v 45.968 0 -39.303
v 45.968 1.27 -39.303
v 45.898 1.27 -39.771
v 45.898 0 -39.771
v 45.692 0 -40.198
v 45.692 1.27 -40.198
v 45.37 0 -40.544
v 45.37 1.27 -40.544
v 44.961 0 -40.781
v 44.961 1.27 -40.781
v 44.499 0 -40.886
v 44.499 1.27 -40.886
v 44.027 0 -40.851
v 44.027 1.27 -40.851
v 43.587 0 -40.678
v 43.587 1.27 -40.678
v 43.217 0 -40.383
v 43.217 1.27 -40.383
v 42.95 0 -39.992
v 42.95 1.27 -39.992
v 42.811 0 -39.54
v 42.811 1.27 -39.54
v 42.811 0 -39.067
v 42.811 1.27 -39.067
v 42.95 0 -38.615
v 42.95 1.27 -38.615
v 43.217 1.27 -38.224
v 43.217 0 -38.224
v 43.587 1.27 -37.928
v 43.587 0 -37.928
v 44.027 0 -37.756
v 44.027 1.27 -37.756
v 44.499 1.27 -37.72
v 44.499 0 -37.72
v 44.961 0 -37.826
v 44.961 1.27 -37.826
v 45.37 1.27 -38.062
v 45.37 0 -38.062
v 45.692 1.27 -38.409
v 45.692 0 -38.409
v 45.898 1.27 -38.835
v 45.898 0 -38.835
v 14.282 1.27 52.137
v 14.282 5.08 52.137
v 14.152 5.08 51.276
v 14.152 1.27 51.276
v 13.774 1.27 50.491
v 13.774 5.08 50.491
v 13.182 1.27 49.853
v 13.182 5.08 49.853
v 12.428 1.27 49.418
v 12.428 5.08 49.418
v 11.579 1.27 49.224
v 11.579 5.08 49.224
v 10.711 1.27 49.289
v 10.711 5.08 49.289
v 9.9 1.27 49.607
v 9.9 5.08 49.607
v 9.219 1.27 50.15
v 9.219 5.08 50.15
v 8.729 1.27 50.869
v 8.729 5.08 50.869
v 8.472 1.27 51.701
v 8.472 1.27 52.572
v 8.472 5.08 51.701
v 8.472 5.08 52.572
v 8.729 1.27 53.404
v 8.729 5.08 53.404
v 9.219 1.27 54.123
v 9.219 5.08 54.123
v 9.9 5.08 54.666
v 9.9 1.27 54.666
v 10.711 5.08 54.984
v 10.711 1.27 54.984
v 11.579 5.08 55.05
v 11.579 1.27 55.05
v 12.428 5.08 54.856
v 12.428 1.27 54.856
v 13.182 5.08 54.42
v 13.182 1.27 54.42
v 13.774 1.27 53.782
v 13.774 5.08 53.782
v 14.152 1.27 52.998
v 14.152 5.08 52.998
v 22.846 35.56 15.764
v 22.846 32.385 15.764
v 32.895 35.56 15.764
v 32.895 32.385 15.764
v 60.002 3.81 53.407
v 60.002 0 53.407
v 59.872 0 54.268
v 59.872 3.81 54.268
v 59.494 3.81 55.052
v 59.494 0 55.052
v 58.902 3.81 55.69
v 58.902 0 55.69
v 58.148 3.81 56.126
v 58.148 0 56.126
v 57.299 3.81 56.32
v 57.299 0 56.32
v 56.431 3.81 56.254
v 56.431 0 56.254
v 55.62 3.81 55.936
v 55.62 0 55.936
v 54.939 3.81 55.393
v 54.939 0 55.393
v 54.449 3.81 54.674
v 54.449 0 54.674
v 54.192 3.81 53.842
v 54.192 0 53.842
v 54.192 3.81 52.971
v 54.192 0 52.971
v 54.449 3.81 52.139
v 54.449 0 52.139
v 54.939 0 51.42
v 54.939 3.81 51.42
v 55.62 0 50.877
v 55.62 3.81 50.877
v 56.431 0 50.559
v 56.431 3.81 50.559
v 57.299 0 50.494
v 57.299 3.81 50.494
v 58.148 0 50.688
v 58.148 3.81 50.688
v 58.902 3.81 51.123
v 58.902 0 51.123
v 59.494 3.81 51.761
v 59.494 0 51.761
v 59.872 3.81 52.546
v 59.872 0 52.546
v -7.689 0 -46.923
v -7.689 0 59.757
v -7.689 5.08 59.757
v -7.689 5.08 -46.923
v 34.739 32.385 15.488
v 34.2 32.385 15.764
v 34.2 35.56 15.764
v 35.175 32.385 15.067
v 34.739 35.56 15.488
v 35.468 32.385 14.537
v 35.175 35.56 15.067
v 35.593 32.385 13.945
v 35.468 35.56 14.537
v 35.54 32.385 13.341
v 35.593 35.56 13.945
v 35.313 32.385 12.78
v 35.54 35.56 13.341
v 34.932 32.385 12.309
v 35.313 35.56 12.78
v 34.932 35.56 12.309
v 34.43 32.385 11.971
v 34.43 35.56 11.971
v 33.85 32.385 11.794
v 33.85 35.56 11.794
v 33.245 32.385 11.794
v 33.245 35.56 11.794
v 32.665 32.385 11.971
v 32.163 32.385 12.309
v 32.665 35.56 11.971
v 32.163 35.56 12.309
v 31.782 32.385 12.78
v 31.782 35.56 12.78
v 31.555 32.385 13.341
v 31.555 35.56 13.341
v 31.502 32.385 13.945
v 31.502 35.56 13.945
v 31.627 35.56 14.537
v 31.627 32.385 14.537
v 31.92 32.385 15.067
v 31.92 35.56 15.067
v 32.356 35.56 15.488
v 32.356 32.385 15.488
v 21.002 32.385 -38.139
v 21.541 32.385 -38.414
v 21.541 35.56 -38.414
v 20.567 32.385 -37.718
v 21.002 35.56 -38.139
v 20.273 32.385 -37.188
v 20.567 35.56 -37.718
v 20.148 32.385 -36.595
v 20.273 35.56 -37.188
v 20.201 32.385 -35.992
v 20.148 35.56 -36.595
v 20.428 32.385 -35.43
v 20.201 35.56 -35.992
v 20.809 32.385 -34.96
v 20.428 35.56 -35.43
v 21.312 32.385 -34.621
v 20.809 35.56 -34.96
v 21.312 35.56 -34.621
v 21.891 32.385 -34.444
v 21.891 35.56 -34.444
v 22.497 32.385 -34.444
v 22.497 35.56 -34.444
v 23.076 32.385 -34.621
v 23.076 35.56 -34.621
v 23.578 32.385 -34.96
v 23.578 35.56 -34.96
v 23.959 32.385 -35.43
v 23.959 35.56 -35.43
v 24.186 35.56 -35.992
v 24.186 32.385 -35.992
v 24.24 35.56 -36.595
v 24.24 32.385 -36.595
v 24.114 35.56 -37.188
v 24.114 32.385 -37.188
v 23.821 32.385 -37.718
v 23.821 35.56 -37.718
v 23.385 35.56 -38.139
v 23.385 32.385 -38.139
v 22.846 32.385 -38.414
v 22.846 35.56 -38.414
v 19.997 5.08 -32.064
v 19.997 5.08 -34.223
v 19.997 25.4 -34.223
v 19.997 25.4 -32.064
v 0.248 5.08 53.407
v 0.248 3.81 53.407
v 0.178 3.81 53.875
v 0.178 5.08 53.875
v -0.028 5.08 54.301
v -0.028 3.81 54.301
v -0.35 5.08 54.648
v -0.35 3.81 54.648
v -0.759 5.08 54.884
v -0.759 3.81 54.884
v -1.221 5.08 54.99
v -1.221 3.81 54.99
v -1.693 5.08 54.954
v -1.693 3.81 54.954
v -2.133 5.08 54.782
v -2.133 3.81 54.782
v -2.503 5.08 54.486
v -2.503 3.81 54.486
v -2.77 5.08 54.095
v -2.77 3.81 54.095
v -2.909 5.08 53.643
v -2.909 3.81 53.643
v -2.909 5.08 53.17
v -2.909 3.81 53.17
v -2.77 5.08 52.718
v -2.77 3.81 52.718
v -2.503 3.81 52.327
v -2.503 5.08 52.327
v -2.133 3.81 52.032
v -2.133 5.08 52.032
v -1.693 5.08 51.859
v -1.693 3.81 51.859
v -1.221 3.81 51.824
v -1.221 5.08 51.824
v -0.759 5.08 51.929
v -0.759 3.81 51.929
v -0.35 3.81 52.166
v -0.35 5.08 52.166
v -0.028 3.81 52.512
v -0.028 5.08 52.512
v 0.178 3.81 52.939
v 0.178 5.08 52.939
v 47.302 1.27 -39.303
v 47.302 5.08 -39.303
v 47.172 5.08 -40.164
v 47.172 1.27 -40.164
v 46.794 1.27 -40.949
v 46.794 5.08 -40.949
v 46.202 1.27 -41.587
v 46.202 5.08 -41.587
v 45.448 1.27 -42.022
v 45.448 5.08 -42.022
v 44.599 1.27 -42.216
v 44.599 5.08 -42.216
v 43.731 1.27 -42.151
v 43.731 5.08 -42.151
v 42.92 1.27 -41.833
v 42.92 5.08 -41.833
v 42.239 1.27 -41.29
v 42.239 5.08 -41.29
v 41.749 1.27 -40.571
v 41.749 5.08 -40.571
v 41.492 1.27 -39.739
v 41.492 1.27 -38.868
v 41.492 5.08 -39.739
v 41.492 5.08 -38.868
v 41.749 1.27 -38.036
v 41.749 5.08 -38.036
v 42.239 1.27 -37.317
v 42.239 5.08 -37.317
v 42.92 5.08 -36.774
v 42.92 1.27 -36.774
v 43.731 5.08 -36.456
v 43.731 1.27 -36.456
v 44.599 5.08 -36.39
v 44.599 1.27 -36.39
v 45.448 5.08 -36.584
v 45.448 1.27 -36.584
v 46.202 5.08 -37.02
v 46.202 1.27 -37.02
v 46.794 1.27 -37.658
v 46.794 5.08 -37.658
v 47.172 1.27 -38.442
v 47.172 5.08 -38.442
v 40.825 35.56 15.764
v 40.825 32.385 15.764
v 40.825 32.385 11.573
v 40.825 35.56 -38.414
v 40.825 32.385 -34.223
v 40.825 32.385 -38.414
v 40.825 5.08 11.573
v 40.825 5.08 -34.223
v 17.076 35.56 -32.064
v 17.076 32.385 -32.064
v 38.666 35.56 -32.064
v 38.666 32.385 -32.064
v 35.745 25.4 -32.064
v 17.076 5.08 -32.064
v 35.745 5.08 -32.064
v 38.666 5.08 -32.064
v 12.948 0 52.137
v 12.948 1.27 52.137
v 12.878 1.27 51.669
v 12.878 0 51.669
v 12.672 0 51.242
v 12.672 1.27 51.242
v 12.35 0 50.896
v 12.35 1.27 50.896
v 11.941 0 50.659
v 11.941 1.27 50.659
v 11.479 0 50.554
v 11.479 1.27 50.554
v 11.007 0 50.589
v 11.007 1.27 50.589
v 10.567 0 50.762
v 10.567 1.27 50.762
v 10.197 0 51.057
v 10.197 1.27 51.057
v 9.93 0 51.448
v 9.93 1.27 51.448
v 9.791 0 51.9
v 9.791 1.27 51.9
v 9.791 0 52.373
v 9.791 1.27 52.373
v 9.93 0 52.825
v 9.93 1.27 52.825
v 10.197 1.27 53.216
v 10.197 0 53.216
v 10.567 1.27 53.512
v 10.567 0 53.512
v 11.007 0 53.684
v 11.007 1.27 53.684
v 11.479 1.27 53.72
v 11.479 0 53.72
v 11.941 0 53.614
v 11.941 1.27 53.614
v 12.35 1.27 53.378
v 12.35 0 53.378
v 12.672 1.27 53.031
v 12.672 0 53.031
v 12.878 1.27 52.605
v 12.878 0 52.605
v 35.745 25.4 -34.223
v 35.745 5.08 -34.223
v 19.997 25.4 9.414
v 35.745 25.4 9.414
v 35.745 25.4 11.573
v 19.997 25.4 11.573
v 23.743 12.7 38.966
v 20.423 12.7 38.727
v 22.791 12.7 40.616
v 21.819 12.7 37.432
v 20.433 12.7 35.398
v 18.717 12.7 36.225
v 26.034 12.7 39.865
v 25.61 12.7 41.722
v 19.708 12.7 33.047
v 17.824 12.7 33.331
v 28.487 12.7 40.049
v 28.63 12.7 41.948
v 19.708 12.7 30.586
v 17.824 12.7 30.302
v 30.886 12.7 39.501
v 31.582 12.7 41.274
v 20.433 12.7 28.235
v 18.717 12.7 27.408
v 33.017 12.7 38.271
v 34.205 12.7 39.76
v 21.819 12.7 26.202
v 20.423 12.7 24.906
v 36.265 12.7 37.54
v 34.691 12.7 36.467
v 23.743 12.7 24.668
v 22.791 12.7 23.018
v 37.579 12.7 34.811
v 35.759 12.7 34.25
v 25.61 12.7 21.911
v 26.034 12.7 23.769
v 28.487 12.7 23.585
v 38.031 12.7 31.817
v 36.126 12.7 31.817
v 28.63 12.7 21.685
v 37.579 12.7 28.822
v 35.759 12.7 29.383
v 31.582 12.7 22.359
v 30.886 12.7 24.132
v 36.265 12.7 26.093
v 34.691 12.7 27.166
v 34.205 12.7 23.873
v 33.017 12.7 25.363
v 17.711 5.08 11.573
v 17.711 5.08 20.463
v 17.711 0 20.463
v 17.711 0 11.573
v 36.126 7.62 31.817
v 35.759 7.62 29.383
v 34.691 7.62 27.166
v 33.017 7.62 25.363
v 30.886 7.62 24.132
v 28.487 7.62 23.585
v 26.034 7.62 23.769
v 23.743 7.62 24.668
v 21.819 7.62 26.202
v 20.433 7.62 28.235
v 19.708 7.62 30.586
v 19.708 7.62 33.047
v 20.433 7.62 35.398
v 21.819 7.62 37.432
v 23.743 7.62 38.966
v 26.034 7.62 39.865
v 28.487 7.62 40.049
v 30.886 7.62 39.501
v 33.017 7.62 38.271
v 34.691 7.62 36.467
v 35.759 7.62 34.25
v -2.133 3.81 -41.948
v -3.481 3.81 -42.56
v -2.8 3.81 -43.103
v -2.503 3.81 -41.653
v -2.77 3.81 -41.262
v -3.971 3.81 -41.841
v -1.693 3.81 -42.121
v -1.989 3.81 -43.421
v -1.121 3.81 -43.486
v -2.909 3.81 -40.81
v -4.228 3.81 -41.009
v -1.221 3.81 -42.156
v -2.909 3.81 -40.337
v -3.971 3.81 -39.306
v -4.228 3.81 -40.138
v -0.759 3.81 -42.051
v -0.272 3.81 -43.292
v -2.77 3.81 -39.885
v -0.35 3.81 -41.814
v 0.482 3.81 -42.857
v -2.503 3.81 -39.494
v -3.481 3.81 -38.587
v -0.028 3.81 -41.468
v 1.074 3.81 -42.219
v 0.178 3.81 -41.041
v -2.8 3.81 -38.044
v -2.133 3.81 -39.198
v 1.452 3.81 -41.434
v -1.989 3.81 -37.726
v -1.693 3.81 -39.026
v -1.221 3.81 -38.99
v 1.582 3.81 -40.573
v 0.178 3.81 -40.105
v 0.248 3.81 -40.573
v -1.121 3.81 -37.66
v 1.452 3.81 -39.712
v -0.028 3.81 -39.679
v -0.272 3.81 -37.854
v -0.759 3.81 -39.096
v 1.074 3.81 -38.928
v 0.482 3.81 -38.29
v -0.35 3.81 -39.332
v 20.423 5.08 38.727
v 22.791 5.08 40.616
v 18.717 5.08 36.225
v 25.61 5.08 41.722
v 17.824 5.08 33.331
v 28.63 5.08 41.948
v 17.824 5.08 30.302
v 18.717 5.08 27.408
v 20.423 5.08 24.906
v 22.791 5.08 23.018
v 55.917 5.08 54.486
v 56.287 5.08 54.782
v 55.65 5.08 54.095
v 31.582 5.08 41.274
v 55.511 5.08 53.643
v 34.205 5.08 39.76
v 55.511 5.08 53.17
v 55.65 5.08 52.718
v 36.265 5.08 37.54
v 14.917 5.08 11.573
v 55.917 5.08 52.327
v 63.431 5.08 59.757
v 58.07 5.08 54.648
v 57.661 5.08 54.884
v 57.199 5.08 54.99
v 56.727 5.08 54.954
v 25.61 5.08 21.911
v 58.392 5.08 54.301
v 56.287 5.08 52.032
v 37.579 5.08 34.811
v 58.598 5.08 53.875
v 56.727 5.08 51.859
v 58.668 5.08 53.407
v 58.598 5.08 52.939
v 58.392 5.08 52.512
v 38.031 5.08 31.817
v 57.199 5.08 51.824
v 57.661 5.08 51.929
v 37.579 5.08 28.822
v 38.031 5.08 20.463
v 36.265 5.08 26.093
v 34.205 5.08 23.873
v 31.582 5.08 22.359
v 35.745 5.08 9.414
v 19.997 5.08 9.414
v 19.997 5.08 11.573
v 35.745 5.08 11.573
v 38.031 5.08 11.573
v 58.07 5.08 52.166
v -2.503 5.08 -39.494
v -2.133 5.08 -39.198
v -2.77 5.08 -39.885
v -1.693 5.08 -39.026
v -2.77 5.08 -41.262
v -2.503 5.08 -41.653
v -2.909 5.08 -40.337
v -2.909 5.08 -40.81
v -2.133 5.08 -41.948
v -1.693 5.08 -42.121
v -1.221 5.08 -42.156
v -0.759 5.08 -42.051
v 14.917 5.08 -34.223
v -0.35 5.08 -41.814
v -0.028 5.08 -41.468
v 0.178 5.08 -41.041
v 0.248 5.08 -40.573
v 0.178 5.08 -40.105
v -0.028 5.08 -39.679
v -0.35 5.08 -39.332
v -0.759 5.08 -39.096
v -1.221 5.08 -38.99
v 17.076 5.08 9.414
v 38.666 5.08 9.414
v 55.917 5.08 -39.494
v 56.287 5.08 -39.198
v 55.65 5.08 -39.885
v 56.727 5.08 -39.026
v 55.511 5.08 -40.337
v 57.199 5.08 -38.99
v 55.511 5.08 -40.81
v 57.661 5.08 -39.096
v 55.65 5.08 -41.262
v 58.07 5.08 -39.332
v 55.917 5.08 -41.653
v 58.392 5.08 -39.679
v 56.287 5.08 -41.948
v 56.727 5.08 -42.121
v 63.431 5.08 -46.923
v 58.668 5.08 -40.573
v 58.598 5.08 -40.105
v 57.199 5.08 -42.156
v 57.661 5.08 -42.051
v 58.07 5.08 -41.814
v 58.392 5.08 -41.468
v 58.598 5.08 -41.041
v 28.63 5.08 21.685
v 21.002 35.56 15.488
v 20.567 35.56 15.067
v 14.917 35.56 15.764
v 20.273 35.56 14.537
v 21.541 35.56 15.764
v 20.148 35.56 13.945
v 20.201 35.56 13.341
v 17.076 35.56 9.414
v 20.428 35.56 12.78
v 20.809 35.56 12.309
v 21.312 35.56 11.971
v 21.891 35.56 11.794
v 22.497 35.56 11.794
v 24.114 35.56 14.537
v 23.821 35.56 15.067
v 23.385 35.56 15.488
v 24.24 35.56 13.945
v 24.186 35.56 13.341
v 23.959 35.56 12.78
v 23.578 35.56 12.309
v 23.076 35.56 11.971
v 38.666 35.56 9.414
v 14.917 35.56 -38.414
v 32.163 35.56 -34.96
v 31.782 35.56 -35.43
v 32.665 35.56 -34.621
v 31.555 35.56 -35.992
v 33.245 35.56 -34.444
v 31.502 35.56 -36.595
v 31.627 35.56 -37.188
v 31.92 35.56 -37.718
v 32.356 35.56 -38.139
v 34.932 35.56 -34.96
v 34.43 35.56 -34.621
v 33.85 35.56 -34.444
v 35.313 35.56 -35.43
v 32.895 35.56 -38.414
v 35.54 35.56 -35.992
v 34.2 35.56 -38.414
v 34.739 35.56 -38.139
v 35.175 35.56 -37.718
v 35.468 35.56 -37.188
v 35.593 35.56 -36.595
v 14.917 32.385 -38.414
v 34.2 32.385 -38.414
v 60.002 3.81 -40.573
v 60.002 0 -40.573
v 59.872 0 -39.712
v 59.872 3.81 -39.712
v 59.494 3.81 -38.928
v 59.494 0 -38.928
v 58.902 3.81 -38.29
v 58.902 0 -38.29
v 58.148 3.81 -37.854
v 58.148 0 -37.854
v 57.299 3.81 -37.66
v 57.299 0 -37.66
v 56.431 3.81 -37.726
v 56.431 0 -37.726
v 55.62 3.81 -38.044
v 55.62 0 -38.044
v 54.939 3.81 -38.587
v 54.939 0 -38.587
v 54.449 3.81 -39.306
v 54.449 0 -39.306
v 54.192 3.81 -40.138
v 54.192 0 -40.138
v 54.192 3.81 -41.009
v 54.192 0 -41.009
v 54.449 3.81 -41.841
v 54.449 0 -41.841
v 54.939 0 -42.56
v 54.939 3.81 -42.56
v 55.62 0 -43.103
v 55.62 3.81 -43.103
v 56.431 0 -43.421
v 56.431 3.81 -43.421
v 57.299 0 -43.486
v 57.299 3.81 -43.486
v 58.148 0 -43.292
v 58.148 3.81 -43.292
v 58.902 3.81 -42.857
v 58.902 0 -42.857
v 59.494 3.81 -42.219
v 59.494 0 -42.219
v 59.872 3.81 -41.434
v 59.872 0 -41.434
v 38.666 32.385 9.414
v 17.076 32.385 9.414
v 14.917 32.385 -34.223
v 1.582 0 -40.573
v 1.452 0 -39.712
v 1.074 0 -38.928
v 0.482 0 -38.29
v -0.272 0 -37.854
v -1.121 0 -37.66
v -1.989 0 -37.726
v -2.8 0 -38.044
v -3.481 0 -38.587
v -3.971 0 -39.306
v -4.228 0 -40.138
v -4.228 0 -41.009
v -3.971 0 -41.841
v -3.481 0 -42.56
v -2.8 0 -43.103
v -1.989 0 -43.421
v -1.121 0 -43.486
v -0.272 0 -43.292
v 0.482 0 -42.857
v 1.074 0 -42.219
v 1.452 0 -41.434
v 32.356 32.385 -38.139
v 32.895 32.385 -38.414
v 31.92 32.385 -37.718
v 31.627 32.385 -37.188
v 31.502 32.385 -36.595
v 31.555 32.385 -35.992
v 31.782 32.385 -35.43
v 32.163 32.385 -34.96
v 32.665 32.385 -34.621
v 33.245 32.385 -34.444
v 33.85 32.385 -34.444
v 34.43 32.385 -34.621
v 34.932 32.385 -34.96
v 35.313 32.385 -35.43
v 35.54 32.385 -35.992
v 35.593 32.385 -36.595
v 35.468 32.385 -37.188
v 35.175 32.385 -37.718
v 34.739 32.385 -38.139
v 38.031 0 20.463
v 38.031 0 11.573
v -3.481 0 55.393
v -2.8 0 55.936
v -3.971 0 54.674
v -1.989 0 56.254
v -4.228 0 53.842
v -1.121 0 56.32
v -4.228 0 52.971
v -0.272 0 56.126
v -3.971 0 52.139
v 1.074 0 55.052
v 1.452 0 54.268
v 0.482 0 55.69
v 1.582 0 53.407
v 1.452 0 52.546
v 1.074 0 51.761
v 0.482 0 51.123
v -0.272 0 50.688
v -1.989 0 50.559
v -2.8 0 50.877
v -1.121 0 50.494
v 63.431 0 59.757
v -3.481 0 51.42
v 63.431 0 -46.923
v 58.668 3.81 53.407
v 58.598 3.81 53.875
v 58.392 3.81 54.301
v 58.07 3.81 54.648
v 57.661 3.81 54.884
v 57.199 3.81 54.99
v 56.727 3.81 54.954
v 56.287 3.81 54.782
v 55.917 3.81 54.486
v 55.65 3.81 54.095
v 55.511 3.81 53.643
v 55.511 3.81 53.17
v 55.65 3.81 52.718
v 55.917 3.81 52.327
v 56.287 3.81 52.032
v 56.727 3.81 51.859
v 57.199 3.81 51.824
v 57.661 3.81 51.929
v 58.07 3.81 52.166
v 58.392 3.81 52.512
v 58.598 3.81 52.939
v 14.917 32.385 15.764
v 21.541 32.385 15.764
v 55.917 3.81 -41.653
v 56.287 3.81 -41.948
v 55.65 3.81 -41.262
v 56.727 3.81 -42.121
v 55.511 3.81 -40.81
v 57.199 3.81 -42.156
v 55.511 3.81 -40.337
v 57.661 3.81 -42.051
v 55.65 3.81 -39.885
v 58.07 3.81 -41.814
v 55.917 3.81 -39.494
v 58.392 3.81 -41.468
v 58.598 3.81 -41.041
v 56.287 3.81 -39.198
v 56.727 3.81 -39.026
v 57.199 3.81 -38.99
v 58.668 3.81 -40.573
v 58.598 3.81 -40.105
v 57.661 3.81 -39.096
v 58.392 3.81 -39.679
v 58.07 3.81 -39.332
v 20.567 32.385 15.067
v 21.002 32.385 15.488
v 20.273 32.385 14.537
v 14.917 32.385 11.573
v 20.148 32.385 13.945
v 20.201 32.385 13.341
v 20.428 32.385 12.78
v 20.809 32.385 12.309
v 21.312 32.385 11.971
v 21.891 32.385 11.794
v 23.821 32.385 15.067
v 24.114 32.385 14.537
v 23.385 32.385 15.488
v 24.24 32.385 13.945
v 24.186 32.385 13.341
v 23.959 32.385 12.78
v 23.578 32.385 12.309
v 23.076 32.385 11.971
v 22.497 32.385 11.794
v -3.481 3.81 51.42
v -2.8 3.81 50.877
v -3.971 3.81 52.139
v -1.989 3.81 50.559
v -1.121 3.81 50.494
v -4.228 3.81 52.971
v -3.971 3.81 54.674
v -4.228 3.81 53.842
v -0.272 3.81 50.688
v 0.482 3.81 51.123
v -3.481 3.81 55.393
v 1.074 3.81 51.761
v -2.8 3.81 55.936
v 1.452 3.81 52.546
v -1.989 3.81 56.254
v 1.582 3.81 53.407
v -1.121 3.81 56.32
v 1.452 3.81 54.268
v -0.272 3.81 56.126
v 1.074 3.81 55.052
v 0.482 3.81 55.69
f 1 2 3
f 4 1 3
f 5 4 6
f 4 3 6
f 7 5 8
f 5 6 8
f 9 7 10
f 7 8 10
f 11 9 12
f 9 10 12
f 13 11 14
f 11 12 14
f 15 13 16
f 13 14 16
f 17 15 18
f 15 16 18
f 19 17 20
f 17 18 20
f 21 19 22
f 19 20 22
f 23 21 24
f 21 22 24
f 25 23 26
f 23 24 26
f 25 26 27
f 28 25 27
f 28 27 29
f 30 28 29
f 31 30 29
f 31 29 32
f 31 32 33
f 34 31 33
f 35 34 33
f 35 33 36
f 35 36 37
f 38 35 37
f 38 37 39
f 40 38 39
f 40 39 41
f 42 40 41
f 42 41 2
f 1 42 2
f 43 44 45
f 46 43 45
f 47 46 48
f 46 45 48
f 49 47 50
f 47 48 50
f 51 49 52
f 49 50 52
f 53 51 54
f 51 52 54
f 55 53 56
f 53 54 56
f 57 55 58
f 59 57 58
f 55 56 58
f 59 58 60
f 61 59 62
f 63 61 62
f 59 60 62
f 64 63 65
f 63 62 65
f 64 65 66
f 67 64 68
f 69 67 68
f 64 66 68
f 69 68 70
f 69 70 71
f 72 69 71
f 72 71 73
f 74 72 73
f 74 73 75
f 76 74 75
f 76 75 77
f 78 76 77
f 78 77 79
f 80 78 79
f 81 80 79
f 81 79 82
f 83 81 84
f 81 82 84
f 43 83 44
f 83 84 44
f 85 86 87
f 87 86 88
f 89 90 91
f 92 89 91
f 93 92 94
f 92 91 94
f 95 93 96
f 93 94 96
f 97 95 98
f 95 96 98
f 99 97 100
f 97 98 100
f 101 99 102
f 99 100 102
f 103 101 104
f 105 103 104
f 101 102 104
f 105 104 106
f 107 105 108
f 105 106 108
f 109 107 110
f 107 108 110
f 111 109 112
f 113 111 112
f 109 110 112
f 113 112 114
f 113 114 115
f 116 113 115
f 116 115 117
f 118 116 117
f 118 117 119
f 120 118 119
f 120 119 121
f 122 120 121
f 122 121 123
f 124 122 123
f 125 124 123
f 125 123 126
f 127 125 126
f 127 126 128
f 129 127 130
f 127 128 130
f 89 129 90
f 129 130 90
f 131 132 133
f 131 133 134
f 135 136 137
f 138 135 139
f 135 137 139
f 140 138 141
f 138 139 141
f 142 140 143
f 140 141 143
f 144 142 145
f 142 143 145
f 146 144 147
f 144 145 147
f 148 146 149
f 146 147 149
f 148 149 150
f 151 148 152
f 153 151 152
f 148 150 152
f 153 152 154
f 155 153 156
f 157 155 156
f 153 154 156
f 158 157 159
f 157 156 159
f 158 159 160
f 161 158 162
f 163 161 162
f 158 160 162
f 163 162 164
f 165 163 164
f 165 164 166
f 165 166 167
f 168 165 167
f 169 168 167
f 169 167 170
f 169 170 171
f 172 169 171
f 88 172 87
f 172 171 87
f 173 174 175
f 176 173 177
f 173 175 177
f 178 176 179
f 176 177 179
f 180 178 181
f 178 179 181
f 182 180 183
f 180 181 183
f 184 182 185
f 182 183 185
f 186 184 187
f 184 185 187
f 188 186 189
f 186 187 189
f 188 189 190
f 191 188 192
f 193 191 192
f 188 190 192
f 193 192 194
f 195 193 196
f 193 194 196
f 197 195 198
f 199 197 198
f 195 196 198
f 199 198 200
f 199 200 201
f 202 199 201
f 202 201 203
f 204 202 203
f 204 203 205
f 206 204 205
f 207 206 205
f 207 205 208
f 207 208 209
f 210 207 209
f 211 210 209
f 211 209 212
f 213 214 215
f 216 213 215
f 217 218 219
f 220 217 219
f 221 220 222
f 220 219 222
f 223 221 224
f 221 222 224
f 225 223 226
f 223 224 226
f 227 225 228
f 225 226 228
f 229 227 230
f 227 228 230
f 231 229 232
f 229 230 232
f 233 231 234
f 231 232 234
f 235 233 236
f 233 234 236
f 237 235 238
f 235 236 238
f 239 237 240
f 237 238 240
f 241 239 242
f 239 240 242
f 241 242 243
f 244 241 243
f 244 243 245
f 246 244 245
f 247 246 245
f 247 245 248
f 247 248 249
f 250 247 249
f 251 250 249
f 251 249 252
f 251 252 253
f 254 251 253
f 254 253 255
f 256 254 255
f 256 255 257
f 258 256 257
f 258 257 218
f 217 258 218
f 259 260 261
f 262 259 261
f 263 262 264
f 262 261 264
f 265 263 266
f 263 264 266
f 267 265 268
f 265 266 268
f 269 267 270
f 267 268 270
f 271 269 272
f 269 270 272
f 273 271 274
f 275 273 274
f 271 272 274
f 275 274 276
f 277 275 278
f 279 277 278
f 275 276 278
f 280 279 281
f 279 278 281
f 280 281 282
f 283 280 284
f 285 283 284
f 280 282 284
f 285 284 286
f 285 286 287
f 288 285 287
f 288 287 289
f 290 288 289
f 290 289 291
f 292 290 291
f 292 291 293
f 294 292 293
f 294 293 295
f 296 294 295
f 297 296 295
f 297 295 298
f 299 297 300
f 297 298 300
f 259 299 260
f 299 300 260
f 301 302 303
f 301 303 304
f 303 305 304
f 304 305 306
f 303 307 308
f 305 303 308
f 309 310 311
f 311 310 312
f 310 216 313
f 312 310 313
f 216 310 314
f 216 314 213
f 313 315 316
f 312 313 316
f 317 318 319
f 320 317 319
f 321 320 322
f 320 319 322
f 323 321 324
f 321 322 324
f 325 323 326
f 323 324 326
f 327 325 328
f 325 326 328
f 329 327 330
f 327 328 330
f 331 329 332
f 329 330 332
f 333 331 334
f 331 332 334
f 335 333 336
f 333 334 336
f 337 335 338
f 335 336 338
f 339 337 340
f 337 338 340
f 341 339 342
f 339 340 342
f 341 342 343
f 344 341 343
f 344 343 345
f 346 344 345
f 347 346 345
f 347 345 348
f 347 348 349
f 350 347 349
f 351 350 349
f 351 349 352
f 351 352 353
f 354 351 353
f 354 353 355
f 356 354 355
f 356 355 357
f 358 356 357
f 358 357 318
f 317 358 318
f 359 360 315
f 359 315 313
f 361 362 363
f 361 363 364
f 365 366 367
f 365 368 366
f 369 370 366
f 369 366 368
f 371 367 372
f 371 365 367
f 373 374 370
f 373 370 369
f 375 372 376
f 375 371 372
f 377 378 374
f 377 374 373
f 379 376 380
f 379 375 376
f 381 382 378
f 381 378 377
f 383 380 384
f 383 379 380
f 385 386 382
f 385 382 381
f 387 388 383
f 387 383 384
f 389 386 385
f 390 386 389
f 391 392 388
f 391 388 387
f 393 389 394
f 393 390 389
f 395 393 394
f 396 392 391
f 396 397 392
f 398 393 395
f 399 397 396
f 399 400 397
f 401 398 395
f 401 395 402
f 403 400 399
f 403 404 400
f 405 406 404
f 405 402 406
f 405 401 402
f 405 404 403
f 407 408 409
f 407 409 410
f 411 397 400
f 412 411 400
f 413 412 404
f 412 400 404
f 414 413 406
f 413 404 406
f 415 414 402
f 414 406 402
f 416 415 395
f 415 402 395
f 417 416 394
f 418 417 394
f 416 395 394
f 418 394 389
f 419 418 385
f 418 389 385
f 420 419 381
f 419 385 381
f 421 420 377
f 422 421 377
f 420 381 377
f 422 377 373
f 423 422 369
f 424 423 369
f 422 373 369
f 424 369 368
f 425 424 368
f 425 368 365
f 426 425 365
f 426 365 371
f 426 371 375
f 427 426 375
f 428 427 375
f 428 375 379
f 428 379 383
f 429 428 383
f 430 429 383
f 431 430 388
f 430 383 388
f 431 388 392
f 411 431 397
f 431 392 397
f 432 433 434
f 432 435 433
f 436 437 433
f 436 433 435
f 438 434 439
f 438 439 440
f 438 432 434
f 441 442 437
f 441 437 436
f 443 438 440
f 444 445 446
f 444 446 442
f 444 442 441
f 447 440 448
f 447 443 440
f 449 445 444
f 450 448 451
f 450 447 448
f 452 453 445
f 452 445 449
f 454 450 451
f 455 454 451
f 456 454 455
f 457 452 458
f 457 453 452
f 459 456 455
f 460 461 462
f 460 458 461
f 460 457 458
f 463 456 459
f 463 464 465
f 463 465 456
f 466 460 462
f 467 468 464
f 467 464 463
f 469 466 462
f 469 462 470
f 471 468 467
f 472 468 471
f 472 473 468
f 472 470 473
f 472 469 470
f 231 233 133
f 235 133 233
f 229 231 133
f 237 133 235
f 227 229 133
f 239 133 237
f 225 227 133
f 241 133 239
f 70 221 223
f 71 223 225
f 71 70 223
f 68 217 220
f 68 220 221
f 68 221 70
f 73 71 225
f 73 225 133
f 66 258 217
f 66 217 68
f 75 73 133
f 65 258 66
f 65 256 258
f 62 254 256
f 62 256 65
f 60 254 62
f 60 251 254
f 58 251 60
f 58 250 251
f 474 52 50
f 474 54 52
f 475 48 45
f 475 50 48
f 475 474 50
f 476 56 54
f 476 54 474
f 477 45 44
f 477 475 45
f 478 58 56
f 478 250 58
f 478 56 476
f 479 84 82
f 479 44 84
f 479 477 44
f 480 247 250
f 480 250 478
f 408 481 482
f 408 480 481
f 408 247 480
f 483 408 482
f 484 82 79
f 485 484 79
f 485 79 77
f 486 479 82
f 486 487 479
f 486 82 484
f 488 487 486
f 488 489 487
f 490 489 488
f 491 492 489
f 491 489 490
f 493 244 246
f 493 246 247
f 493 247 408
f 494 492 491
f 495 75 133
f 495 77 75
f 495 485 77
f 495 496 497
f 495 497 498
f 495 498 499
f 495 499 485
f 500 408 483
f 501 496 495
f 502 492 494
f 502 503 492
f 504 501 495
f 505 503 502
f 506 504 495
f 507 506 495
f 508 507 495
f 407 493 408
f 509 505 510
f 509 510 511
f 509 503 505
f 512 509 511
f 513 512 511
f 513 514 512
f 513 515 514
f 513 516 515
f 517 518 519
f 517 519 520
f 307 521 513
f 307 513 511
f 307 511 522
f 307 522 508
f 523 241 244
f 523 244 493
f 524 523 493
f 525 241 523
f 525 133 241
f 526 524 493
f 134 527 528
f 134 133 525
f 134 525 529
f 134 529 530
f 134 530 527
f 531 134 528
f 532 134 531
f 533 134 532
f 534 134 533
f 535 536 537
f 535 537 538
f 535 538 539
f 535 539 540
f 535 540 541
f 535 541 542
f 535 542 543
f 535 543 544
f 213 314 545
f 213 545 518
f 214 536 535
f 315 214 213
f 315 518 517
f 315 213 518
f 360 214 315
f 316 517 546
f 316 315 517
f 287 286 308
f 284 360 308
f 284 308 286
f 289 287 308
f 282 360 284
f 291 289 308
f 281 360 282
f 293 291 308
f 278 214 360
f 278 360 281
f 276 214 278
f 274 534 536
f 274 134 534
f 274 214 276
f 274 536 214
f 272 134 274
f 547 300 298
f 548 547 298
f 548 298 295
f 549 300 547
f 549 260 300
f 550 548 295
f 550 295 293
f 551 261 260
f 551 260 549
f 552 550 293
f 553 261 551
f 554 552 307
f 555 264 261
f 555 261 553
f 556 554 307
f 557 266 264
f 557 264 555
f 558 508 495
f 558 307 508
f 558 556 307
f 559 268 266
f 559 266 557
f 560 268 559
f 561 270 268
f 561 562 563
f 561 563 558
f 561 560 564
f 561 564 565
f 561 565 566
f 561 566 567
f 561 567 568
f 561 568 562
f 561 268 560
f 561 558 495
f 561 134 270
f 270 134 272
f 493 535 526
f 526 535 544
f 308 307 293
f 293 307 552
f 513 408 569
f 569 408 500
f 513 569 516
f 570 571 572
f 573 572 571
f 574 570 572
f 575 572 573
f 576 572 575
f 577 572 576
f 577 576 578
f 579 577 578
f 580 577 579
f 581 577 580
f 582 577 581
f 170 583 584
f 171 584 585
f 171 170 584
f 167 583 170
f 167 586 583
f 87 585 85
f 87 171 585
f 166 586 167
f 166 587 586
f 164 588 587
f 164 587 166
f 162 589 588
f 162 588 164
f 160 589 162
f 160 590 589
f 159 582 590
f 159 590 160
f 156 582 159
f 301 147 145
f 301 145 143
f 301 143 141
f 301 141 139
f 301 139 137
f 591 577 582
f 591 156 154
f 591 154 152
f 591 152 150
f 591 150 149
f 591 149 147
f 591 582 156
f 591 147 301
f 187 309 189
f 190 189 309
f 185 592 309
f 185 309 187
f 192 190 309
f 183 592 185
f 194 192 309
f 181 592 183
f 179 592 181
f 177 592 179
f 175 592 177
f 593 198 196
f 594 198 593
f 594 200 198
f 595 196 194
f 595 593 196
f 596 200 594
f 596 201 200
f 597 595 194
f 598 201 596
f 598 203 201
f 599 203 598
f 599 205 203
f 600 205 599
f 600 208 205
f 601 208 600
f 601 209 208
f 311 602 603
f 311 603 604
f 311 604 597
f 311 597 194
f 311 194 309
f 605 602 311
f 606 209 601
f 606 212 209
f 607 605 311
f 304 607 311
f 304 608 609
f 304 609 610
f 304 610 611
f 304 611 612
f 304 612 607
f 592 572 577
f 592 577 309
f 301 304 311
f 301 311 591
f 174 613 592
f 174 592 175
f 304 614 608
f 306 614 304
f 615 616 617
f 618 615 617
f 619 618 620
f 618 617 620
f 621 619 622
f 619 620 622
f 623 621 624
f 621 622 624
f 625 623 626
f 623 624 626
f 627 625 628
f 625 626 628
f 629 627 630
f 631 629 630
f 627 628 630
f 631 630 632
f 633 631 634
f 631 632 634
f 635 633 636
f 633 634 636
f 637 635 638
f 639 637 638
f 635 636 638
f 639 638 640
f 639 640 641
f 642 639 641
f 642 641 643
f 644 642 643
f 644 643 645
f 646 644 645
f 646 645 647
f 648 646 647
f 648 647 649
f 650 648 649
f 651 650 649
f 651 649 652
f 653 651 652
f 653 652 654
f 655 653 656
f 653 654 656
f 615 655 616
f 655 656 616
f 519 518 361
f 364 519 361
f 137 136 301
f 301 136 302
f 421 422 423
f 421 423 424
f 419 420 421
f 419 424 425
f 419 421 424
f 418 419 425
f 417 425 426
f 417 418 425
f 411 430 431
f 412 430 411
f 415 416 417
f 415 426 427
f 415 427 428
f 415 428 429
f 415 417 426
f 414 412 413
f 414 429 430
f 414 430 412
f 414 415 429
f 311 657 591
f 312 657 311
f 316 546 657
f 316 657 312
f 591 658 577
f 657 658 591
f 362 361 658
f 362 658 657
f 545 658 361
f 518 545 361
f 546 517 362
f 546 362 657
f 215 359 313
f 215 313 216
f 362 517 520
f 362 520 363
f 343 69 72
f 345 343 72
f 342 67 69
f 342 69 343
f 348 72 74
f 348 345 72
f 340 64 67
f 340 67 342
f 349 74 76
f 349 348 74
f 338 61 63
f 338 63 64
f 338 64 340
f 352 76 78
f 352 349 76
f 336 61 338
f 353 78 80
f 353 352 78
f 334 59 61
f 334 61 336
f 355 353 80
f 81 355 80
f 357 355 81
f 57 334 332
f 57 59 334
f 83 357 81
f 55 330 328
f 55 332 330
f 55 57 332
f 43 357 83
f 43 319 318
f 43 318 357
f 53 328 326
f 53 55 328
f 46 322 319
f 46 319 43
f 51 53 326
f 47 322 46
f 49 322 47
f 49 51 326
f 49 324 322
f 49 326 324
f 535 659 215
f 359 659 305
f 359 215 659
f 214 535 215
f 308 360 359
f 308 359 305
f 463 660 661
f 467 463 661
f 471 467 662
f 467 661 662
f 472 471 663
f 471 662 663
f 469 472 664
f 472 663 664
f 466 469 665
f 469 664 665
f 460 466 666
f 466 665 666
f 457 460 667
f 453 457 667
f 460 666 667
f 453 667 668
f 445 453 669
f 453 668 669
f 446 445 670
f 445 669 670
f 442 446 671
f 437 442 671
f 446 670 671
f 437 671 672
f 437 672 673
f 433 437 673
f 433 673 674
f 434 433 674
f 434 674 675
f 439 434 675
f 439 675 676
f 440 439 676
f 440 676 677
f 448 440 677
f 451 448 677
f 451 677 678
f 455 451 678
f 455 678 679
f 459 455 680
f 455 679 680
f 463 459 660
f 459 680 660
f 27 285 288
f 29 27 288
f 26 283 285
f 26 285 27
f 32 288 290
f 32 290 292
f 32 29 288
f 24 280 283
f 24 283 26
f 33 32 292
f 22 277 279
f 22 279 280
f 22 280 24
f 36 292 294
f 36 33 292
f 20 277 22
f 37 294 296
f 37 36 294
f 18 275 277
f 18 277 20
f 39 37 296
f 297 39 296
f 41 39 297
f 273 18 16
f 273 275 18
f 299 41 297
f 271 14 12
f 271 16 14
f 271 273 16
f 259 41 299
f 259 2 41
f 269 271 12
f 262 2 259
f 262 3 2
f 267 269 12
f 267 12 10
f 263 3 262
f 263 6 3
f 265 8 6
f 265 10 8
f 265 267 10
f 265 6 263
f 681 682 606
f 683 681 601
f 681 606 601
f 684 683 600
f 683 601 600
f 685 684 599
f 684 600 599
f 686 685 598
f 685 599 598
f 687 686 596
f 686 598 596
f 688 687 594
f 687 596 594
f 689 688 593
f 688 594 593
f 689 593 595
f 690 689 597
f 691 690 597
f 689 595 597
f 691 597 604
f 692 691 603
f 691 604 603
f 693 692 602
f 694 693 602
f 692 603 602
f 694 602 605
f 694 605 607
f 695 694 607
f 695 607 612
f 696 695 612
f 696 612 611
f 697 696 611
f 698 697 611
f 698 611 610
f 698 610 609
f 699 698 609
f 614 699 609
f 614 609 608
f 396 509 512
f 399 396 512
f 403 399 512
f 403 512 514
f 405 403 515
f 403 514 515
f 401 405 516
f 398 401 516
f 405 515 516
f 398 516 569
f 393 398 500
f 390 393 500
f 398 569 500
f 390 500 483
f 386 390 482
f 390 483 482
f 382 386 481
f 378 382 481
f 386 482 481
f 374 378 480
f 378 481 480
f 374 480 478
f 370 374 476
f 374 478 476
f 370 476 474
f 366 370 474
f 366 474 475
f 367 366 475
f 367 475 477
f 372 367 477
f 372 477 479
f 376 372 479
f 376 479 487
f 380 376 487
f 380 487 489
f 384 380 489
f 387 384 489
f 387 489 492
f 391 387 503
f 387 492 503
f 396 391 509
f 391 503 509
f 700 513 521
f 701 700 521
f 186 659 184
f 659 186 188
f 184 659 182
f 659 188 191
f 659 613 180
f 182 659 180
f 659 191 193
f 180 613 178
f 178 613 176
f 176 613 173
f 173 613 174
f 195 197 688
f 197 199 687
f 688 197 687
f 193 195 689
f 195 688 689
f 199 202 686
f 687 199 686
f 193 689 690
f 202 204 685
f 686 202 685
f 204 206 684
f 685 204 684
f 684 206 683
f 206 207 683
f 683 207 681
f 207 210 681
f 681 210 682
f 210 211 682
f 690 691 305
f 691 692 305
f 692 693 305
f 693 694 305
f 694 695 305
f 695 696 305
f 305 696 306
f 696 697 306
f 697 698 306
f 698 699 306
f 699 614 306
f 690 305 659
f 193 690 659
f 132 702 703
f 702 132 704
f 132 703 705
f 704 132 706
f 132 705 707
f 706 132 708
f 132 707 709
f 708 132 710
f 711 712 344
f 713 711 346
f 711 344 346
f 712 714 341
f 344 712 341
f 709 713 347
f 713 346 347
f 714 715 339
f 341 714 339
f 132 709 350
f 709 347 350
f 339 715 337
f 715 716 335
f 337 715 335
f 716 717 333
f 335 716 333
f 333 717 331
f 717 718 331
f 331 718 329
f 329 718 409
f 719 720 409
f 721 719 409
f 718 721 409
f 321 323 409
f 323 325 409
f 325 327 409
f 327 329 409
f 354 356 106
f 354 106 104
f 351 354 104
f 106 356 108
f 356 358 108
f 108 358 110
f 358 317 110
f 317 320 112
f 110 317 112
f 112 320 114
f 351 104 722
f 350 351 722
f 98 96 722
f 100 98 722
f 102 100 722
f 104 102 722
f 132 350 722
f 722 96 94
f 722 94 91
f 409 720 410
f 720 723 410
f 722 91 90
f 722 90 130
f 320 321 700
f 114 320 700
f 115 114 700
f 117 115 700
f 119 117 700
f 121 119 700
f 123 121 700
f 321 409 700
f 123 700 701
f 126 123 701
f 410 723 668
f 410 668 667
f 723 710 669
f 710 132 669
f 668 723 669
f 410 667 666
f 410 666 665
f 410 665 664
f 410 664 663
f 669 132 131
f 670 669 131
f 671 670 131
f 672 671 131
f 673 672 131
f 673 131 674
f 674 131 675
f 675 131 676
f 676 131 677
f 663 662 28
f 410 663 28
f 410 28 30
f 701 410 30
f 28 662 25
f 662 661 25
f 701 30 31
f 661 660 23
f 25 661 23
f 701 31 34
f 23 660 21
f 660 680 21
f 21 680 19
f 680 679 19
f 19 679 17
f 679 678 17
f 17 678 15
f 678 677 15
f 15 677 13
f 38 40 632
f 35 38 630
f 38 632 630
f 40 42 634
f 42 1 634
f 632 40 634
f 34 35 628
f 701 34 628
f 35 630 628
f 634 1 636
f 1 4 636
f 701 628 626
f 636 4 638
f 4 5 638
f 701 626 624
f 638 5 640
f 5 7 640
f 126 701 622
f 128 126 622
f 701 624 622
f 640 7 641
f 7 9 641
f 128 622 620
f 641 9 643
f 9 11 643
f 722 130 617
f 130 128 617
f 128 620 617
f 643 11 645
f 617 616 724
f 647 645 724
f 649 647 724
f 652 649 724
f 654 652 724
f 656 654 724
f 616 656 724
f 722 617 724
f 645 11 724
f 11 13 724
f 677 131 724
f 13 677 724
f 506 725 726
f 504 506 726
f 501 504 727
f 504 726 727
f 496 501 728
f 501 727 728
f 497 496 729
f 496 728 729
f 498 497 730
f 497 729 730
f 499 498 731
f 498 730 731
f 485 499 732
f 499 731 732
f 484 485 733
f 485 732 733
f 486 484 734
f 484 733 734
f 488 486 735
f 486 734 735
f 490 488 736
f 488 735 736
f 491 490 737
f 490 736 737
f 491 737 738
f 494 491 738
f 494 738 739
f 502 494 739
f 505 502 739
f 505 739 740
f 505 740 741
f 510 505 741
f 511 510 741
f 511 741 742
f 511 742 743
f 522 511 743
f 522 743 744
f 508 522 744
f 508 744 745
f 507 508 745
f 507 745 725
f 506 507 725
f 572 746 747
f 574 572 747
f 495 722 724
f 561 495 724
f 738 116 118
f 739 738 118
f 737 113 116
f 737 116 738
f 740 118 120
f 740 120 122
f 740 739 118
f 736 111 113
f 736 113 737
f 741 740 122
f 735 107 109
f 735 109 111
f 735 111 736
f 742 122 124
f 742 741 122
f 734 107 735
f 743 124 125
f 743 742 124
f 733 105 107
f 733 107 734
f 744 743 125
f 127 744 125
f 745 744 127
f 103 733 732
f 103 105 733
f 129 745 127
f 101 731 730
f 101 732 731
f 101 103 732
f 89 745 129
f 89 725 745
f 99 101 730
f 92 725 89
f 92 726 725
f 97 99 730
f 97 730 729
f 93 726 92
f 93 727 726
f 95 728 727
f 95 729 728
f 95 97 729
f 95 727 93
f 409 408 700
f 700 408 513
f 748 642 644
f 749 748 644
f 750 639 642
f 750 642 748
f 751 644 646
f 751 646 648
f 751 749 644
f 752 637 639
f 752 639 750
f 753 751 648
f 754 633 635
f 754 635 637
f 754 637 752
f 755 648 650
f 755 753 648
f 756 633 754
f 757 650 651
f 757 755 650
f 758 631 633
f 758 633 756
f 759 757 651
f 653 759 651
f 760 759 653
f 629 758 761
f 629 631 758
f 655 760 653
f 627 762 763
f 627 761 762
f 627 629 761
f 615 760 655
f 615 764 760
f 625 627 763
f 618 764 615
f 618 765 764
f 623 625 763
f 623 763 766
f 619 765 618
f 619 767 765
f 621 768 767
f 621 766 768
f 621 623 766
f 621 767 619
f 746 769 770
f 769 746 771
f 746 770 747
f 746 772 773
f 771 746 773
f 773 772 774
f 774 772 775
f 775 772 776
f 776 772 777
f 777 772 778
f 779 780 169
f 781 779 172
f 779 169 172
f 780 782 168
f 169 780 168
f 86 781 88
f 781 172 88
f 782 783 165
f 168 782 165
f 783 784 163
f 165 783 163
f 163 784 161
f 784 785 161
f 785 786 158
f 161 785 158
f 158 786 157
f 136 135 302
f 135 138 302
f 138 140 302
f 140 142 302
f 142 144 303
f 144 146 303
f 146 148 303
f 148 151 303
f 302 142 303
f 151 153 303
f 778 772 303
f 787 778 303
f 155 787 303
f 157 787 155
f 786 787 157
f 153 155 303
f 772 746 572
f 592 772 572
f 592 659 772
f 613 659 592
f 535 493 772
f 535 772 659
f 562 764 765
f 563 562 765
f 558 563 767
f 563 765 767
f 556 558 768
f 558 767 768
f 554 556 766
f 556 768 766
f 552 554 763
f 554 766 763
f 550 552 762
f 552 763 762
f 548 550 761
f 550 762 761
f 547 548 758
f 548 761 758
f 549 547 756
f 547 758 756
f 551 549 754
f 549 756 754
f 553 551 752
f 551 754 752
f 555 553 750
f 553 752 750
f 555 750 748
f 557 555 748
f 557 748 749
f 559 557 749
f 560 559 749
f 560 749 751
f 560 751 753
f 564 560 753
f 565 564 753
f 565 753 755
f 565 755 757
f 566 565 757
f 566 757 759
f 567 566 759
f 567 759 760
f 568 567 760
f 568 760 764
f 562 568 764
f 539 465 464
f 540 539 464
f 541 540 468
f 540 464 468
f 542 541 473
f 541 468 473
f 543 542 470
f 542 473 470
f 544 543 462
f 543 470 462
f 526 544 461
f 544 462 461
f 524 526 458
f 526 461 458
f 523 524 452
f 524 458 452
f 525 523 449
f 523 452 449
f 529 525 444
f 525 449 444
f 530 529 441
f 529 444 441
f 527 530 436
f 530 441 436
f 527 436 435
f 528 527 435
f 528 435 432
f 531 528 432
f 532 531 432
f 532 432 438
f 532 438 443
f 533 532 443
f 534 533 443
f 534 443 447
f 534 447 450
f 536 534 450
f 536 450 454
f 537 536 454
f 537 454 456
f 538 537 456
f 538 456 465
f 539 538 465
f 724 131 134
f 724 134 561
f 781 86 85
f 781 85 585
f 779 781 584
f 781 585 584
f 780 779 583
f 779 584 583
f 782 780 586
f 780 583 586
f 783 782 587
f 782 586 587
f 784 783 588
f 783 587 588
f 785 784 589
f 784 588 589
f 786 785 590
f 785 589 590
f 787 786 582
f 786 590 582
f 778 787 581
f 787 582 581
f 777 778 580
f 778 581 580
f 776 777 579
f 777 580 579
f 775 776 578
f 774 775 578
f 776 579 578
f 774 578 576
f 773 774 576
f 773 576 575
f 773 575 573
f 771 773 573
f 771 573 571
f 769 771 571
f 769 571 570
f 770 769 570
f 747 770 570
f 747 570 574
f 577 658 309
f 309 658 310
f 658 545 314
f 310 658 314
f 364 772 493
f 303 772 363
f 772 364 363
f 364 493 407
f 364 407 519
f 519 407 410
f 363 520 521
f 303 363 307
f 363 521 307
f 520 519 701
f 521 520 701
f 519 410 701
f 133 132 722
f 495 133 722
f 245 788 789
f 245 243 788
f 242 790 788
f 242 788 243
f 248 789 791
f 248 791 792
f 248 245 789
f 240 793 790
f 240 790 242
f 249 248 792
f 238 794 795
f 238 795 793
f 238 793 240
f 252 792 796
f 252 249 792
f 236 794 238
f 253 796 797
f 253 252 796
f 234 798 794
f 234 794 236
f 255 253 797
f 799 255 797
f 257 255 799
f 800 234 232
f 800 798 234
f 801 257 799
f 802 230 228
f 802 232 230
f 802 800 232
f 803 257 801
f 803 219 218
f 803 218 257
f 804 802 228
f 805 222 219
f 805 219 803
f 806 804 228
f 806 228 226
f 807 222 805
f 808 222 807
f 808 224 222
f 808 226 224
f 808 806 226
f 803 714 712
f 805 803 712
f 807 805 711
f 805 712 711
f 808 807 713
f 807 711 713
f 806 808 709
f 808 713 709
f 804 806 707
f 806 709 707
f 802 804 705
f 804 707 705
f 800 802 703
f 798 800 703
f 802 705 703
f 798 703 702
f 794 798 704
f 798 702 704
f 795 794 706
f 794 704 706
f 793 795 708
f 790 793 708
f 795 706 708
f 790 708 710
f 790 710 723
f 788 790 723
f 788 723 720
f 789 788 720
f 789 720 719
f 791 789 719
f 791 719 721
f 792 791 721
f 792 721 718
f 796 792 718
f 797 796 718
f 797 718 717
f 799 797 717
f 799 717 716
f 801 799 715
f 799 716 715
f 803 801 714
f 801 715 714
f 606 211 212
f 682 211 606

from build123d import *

# Parameters (mm, degrees)
SKETCH1_W           = 71.12
SKETCH1_H           = 106.68
BOSS_EXTRUDE1_DEPTH = 5.08
SKETCH3_W           = 25.908
SKETCH3_H           = 45.7962
SKETCH3_W_2         = 21.59
SKETCH3_H_2         = 41.4782
BOSS_EXTRUDE2_DEPTH = 27.305
SKETCH4_W           = 25.908
SKETCH4_H           = 54.1782
SKETCH4_W_2         = 21.59
SKETCH4_H_2         = 41.4782
BOSS_EXTRUDE3_DEPTH = 3.175
SKETCH5_R           = 2.04968221
CUT_EXTRUDE1_DEPTH  = 3.175
SKETCH7_W           = 15.748
SKETCH7_H           = 20.32
CUT_EXTRUDE3_DEPTH  = 45.7962
SKETCH8_R           = 10.16
BOSS_EXTRUDE4_DEPTH = 7.62
SKETCH9_R           = 8.255
CUT_EXTRUDE4_DEPTH  = 5.08
SKETCH10_W          = 20.32
SKETCH10_H          = 8.89
CUT_EXTRUDE5_DEPTH  = 6.08
SKETCH11_R          = 1.5875
CUT_EXTRUDE6_DEPTH  = 6.08
SKETCH15_R          = 2.921
CUT_EXTRUDE7_DEPTH  = 3.81
SKETCH16_R          = 2.921
CUT_EXTRUDE8_DEPTH  = 3.81
SKETCH17_R          = 1.5875
CUT_EXTRUDE9_DEPTH  = 36.56


with BuildPart() as part:
    # Sketch1 → Boss-Extrude1 (new body)
    with BuildSketch(Plane(origin=(56.401870569, 0, 2.613156724), x_dir=(1, 0, 0), z_dir=(0, 1, 0))):
        with Locations((-28.531301018, -3.803535099)):
            Rectangle(SKETCH1_W, SKETCH1_H)
    extrude(amount=BOSS_EXTRUDE1_DEPTH)

    # Sketch3 → Boss-Extrude2 (add)
    with BuildSketch(Plane(origin=(56.401870569, 5.08, 2.613156724), x_dir=(1, 0, 0), z_dir=(0, 1, 0))):
        with Locations((-28.531301018, 13.938364901)):
            Rectangle(SKETCH3_W, SKETCH3_H)
        with Locations((-28.531301018, 13.938364901)):
            Rectangle(SKETCH3_W_2, SKETCH3_H_2, mode=Mode.SUBTRACT)
    extrude(amount=BOSS_EXTRUDE2_DEPTH)

    # Sketch4 → Boss-Extrude3 (add)
    with BuildSketch(Plane(origin=(0, 32.385, 0), x_dir=(1, 0, 0), z_dir=(0, 1, 0))):
        with Locations((27.87056955, 11.325208176)):
            Rectangle(SKETCH4_W, SKETCH4_H)
        with Locations((27.87056955, 11.325208176)):
            Rectangle(SKETCH4_W_2, SKETCH4_H_2, mode=Mode.SUBTRACT)
    extrude(amount=BOSS_EXTRUDE3_DEPTH)

    # Sketch5 → Cut-Extrude1 (cut)
    with BuildSketch(Plane(origin=(0, 35.56, 0), x_dir=(1, 0, 0), z_dir=(0, 1, 0))):
        with Locations((22.19366955, 36.471208176)):
            Circle(SKETCH5_R)
        with Locations((33.54746955, 36.471208176)):
            Circle(SKETCH5_R)
        with Locations((22.19366955, -13.820791824)):
            Circle(SKETCH5_R)
        with Locations((33.54746955, -13.820791824)):
            Circle(SKETCH5_R)
    extrude(amount=-CUT_EXTRUDE1_DEPTH, mode=Mode.SUBTRACT)

    # Sketch7 → Cut-Extrude3 (cut)
    with BuildSketch(Plane(origin=(0, 0, -34.223308176), x_dir=(-1, 0, 0), z_dir=(0, 0, -1))):
        with Locations((-27.87056955, 15.24)):
            Rectangle(SKETCH7_W, SKETCH7_H)
    extrude(amount=-CUT_EXTRUDE3_DEPTH, mode=Mode.SUBTRACT)

    # Sketch8 → Boss-Extrude4 (add)
    with BuildSketch(Plane(origin=(0, 5.08, 0), x_dir=(1, 0, 0), z_dir=(0, 1, 0))):
        with Locations((27.87056955, -31.816691824)):
            Circle(SKETCH8_R)
    extrude(amount=BOSS_EXTRUDE4_DEPTH)

    # Sketch9 → Cut-Extrude4 (cut)
    with BuildSketch(Plane(origin=(0, 12.7, 0), x_dir=(1, 0, 0), z_dir=(0, 1, 0))):
        with Locations((27.87056955, -31.816691824)):
            Circle(SKETCH9_R)
    extrude(amount=-CUT_EXTRUDE4_DEPTH, mode=Mode.SUBTRACT)

    # Sketch10 → Cut-Extrude5 (cut, through all)
    with BuildSketch(Plane(origin=(0, 5.08, 0), x_dir=(1, 0, 0), z_dir=(0, 1, 0))):
        with Locations((27.87056955, -16.017891824)):
            Rectangle(SKETCH10_W, SKETCH10_H)
    extrude(amount=-CUT_EXTRUDE5_DEPTH, mode=Mode.SUBTRACT)

    # Sketch11 → Cut-Extrude6 (cut, through all)
    with BuildSketch(Plane(origin=(0, 5.08, 0), x_dir=(1, 0, 0), z_dir=(0, 1, 0))):
        with Locations((44.38056955, 39.303308176)):
            Circle(SKETCH11_R)
        with Locations((11.36056955, -52.136691824)):
            Circle(SKETCH11_R)
    extrude(amount=-CUT_EXTRUDE6_DEPTH, mode=Mode.SUBTRACT)

    # Sketch15 → Cut-Extrude7 (cut)
    with BuildSketch(Plane(origin=(0, 5.08, 0), x_dir=(1, 0, 0), z_dir=(0, 1, 0))):
        with Locations((11.36056955, -52.136691824)):
            Circle(SKETCH15_R)
        with Locations((44.38056955, 39.303308176)):
            Circle(SKETCH15_R)
    extrude(amount=-CUT_EXTRUDE7_DEPTH, mode=Mode.SUBTRACT)

    # Sketch16 → Cut-Extrude8 (cut)
    with BuildSketch(Plane.XZ):
        with Locations((-1.33943045, 53.406691824)):
            Circle(SKETCH16_R)
        with Locations((57.08056955, 53.406691824)):
            Circle(SKETCH16_R)
        with Locations((57.08056955, -40.573308176)):
            Circle(SKETCH16_R)
        with Locations((-1.33943045, -40.573308176)):
            Circle(SKETCH16_R)
    extrude(amount=-CUT_EXTRUDE8_DEPTH, mode=Mode.SUBTRACT)

    # Sketch17 → Cut-Extrude9 (cut, through all)
    with BuildSketch(Plane.XZ):
        with Locations((-1.33943045, 53.406691824)):
            Circle(SKETCH17_R)
        with Locations((57.08056955, 53.406691824)):
            Circle(SKETCH17_R)
        with Locations((57.08056955, -40.573308176)):
            Circle(SKETCH17_R)
        with Locations((-1.33943045, -40.573308176)):
            Circle(SKETCH17_R)
    extrude(amount=-CUT_EXTRUDE9_DEPTH, mode=Mode.SUBTRACT)


solid = part.part
